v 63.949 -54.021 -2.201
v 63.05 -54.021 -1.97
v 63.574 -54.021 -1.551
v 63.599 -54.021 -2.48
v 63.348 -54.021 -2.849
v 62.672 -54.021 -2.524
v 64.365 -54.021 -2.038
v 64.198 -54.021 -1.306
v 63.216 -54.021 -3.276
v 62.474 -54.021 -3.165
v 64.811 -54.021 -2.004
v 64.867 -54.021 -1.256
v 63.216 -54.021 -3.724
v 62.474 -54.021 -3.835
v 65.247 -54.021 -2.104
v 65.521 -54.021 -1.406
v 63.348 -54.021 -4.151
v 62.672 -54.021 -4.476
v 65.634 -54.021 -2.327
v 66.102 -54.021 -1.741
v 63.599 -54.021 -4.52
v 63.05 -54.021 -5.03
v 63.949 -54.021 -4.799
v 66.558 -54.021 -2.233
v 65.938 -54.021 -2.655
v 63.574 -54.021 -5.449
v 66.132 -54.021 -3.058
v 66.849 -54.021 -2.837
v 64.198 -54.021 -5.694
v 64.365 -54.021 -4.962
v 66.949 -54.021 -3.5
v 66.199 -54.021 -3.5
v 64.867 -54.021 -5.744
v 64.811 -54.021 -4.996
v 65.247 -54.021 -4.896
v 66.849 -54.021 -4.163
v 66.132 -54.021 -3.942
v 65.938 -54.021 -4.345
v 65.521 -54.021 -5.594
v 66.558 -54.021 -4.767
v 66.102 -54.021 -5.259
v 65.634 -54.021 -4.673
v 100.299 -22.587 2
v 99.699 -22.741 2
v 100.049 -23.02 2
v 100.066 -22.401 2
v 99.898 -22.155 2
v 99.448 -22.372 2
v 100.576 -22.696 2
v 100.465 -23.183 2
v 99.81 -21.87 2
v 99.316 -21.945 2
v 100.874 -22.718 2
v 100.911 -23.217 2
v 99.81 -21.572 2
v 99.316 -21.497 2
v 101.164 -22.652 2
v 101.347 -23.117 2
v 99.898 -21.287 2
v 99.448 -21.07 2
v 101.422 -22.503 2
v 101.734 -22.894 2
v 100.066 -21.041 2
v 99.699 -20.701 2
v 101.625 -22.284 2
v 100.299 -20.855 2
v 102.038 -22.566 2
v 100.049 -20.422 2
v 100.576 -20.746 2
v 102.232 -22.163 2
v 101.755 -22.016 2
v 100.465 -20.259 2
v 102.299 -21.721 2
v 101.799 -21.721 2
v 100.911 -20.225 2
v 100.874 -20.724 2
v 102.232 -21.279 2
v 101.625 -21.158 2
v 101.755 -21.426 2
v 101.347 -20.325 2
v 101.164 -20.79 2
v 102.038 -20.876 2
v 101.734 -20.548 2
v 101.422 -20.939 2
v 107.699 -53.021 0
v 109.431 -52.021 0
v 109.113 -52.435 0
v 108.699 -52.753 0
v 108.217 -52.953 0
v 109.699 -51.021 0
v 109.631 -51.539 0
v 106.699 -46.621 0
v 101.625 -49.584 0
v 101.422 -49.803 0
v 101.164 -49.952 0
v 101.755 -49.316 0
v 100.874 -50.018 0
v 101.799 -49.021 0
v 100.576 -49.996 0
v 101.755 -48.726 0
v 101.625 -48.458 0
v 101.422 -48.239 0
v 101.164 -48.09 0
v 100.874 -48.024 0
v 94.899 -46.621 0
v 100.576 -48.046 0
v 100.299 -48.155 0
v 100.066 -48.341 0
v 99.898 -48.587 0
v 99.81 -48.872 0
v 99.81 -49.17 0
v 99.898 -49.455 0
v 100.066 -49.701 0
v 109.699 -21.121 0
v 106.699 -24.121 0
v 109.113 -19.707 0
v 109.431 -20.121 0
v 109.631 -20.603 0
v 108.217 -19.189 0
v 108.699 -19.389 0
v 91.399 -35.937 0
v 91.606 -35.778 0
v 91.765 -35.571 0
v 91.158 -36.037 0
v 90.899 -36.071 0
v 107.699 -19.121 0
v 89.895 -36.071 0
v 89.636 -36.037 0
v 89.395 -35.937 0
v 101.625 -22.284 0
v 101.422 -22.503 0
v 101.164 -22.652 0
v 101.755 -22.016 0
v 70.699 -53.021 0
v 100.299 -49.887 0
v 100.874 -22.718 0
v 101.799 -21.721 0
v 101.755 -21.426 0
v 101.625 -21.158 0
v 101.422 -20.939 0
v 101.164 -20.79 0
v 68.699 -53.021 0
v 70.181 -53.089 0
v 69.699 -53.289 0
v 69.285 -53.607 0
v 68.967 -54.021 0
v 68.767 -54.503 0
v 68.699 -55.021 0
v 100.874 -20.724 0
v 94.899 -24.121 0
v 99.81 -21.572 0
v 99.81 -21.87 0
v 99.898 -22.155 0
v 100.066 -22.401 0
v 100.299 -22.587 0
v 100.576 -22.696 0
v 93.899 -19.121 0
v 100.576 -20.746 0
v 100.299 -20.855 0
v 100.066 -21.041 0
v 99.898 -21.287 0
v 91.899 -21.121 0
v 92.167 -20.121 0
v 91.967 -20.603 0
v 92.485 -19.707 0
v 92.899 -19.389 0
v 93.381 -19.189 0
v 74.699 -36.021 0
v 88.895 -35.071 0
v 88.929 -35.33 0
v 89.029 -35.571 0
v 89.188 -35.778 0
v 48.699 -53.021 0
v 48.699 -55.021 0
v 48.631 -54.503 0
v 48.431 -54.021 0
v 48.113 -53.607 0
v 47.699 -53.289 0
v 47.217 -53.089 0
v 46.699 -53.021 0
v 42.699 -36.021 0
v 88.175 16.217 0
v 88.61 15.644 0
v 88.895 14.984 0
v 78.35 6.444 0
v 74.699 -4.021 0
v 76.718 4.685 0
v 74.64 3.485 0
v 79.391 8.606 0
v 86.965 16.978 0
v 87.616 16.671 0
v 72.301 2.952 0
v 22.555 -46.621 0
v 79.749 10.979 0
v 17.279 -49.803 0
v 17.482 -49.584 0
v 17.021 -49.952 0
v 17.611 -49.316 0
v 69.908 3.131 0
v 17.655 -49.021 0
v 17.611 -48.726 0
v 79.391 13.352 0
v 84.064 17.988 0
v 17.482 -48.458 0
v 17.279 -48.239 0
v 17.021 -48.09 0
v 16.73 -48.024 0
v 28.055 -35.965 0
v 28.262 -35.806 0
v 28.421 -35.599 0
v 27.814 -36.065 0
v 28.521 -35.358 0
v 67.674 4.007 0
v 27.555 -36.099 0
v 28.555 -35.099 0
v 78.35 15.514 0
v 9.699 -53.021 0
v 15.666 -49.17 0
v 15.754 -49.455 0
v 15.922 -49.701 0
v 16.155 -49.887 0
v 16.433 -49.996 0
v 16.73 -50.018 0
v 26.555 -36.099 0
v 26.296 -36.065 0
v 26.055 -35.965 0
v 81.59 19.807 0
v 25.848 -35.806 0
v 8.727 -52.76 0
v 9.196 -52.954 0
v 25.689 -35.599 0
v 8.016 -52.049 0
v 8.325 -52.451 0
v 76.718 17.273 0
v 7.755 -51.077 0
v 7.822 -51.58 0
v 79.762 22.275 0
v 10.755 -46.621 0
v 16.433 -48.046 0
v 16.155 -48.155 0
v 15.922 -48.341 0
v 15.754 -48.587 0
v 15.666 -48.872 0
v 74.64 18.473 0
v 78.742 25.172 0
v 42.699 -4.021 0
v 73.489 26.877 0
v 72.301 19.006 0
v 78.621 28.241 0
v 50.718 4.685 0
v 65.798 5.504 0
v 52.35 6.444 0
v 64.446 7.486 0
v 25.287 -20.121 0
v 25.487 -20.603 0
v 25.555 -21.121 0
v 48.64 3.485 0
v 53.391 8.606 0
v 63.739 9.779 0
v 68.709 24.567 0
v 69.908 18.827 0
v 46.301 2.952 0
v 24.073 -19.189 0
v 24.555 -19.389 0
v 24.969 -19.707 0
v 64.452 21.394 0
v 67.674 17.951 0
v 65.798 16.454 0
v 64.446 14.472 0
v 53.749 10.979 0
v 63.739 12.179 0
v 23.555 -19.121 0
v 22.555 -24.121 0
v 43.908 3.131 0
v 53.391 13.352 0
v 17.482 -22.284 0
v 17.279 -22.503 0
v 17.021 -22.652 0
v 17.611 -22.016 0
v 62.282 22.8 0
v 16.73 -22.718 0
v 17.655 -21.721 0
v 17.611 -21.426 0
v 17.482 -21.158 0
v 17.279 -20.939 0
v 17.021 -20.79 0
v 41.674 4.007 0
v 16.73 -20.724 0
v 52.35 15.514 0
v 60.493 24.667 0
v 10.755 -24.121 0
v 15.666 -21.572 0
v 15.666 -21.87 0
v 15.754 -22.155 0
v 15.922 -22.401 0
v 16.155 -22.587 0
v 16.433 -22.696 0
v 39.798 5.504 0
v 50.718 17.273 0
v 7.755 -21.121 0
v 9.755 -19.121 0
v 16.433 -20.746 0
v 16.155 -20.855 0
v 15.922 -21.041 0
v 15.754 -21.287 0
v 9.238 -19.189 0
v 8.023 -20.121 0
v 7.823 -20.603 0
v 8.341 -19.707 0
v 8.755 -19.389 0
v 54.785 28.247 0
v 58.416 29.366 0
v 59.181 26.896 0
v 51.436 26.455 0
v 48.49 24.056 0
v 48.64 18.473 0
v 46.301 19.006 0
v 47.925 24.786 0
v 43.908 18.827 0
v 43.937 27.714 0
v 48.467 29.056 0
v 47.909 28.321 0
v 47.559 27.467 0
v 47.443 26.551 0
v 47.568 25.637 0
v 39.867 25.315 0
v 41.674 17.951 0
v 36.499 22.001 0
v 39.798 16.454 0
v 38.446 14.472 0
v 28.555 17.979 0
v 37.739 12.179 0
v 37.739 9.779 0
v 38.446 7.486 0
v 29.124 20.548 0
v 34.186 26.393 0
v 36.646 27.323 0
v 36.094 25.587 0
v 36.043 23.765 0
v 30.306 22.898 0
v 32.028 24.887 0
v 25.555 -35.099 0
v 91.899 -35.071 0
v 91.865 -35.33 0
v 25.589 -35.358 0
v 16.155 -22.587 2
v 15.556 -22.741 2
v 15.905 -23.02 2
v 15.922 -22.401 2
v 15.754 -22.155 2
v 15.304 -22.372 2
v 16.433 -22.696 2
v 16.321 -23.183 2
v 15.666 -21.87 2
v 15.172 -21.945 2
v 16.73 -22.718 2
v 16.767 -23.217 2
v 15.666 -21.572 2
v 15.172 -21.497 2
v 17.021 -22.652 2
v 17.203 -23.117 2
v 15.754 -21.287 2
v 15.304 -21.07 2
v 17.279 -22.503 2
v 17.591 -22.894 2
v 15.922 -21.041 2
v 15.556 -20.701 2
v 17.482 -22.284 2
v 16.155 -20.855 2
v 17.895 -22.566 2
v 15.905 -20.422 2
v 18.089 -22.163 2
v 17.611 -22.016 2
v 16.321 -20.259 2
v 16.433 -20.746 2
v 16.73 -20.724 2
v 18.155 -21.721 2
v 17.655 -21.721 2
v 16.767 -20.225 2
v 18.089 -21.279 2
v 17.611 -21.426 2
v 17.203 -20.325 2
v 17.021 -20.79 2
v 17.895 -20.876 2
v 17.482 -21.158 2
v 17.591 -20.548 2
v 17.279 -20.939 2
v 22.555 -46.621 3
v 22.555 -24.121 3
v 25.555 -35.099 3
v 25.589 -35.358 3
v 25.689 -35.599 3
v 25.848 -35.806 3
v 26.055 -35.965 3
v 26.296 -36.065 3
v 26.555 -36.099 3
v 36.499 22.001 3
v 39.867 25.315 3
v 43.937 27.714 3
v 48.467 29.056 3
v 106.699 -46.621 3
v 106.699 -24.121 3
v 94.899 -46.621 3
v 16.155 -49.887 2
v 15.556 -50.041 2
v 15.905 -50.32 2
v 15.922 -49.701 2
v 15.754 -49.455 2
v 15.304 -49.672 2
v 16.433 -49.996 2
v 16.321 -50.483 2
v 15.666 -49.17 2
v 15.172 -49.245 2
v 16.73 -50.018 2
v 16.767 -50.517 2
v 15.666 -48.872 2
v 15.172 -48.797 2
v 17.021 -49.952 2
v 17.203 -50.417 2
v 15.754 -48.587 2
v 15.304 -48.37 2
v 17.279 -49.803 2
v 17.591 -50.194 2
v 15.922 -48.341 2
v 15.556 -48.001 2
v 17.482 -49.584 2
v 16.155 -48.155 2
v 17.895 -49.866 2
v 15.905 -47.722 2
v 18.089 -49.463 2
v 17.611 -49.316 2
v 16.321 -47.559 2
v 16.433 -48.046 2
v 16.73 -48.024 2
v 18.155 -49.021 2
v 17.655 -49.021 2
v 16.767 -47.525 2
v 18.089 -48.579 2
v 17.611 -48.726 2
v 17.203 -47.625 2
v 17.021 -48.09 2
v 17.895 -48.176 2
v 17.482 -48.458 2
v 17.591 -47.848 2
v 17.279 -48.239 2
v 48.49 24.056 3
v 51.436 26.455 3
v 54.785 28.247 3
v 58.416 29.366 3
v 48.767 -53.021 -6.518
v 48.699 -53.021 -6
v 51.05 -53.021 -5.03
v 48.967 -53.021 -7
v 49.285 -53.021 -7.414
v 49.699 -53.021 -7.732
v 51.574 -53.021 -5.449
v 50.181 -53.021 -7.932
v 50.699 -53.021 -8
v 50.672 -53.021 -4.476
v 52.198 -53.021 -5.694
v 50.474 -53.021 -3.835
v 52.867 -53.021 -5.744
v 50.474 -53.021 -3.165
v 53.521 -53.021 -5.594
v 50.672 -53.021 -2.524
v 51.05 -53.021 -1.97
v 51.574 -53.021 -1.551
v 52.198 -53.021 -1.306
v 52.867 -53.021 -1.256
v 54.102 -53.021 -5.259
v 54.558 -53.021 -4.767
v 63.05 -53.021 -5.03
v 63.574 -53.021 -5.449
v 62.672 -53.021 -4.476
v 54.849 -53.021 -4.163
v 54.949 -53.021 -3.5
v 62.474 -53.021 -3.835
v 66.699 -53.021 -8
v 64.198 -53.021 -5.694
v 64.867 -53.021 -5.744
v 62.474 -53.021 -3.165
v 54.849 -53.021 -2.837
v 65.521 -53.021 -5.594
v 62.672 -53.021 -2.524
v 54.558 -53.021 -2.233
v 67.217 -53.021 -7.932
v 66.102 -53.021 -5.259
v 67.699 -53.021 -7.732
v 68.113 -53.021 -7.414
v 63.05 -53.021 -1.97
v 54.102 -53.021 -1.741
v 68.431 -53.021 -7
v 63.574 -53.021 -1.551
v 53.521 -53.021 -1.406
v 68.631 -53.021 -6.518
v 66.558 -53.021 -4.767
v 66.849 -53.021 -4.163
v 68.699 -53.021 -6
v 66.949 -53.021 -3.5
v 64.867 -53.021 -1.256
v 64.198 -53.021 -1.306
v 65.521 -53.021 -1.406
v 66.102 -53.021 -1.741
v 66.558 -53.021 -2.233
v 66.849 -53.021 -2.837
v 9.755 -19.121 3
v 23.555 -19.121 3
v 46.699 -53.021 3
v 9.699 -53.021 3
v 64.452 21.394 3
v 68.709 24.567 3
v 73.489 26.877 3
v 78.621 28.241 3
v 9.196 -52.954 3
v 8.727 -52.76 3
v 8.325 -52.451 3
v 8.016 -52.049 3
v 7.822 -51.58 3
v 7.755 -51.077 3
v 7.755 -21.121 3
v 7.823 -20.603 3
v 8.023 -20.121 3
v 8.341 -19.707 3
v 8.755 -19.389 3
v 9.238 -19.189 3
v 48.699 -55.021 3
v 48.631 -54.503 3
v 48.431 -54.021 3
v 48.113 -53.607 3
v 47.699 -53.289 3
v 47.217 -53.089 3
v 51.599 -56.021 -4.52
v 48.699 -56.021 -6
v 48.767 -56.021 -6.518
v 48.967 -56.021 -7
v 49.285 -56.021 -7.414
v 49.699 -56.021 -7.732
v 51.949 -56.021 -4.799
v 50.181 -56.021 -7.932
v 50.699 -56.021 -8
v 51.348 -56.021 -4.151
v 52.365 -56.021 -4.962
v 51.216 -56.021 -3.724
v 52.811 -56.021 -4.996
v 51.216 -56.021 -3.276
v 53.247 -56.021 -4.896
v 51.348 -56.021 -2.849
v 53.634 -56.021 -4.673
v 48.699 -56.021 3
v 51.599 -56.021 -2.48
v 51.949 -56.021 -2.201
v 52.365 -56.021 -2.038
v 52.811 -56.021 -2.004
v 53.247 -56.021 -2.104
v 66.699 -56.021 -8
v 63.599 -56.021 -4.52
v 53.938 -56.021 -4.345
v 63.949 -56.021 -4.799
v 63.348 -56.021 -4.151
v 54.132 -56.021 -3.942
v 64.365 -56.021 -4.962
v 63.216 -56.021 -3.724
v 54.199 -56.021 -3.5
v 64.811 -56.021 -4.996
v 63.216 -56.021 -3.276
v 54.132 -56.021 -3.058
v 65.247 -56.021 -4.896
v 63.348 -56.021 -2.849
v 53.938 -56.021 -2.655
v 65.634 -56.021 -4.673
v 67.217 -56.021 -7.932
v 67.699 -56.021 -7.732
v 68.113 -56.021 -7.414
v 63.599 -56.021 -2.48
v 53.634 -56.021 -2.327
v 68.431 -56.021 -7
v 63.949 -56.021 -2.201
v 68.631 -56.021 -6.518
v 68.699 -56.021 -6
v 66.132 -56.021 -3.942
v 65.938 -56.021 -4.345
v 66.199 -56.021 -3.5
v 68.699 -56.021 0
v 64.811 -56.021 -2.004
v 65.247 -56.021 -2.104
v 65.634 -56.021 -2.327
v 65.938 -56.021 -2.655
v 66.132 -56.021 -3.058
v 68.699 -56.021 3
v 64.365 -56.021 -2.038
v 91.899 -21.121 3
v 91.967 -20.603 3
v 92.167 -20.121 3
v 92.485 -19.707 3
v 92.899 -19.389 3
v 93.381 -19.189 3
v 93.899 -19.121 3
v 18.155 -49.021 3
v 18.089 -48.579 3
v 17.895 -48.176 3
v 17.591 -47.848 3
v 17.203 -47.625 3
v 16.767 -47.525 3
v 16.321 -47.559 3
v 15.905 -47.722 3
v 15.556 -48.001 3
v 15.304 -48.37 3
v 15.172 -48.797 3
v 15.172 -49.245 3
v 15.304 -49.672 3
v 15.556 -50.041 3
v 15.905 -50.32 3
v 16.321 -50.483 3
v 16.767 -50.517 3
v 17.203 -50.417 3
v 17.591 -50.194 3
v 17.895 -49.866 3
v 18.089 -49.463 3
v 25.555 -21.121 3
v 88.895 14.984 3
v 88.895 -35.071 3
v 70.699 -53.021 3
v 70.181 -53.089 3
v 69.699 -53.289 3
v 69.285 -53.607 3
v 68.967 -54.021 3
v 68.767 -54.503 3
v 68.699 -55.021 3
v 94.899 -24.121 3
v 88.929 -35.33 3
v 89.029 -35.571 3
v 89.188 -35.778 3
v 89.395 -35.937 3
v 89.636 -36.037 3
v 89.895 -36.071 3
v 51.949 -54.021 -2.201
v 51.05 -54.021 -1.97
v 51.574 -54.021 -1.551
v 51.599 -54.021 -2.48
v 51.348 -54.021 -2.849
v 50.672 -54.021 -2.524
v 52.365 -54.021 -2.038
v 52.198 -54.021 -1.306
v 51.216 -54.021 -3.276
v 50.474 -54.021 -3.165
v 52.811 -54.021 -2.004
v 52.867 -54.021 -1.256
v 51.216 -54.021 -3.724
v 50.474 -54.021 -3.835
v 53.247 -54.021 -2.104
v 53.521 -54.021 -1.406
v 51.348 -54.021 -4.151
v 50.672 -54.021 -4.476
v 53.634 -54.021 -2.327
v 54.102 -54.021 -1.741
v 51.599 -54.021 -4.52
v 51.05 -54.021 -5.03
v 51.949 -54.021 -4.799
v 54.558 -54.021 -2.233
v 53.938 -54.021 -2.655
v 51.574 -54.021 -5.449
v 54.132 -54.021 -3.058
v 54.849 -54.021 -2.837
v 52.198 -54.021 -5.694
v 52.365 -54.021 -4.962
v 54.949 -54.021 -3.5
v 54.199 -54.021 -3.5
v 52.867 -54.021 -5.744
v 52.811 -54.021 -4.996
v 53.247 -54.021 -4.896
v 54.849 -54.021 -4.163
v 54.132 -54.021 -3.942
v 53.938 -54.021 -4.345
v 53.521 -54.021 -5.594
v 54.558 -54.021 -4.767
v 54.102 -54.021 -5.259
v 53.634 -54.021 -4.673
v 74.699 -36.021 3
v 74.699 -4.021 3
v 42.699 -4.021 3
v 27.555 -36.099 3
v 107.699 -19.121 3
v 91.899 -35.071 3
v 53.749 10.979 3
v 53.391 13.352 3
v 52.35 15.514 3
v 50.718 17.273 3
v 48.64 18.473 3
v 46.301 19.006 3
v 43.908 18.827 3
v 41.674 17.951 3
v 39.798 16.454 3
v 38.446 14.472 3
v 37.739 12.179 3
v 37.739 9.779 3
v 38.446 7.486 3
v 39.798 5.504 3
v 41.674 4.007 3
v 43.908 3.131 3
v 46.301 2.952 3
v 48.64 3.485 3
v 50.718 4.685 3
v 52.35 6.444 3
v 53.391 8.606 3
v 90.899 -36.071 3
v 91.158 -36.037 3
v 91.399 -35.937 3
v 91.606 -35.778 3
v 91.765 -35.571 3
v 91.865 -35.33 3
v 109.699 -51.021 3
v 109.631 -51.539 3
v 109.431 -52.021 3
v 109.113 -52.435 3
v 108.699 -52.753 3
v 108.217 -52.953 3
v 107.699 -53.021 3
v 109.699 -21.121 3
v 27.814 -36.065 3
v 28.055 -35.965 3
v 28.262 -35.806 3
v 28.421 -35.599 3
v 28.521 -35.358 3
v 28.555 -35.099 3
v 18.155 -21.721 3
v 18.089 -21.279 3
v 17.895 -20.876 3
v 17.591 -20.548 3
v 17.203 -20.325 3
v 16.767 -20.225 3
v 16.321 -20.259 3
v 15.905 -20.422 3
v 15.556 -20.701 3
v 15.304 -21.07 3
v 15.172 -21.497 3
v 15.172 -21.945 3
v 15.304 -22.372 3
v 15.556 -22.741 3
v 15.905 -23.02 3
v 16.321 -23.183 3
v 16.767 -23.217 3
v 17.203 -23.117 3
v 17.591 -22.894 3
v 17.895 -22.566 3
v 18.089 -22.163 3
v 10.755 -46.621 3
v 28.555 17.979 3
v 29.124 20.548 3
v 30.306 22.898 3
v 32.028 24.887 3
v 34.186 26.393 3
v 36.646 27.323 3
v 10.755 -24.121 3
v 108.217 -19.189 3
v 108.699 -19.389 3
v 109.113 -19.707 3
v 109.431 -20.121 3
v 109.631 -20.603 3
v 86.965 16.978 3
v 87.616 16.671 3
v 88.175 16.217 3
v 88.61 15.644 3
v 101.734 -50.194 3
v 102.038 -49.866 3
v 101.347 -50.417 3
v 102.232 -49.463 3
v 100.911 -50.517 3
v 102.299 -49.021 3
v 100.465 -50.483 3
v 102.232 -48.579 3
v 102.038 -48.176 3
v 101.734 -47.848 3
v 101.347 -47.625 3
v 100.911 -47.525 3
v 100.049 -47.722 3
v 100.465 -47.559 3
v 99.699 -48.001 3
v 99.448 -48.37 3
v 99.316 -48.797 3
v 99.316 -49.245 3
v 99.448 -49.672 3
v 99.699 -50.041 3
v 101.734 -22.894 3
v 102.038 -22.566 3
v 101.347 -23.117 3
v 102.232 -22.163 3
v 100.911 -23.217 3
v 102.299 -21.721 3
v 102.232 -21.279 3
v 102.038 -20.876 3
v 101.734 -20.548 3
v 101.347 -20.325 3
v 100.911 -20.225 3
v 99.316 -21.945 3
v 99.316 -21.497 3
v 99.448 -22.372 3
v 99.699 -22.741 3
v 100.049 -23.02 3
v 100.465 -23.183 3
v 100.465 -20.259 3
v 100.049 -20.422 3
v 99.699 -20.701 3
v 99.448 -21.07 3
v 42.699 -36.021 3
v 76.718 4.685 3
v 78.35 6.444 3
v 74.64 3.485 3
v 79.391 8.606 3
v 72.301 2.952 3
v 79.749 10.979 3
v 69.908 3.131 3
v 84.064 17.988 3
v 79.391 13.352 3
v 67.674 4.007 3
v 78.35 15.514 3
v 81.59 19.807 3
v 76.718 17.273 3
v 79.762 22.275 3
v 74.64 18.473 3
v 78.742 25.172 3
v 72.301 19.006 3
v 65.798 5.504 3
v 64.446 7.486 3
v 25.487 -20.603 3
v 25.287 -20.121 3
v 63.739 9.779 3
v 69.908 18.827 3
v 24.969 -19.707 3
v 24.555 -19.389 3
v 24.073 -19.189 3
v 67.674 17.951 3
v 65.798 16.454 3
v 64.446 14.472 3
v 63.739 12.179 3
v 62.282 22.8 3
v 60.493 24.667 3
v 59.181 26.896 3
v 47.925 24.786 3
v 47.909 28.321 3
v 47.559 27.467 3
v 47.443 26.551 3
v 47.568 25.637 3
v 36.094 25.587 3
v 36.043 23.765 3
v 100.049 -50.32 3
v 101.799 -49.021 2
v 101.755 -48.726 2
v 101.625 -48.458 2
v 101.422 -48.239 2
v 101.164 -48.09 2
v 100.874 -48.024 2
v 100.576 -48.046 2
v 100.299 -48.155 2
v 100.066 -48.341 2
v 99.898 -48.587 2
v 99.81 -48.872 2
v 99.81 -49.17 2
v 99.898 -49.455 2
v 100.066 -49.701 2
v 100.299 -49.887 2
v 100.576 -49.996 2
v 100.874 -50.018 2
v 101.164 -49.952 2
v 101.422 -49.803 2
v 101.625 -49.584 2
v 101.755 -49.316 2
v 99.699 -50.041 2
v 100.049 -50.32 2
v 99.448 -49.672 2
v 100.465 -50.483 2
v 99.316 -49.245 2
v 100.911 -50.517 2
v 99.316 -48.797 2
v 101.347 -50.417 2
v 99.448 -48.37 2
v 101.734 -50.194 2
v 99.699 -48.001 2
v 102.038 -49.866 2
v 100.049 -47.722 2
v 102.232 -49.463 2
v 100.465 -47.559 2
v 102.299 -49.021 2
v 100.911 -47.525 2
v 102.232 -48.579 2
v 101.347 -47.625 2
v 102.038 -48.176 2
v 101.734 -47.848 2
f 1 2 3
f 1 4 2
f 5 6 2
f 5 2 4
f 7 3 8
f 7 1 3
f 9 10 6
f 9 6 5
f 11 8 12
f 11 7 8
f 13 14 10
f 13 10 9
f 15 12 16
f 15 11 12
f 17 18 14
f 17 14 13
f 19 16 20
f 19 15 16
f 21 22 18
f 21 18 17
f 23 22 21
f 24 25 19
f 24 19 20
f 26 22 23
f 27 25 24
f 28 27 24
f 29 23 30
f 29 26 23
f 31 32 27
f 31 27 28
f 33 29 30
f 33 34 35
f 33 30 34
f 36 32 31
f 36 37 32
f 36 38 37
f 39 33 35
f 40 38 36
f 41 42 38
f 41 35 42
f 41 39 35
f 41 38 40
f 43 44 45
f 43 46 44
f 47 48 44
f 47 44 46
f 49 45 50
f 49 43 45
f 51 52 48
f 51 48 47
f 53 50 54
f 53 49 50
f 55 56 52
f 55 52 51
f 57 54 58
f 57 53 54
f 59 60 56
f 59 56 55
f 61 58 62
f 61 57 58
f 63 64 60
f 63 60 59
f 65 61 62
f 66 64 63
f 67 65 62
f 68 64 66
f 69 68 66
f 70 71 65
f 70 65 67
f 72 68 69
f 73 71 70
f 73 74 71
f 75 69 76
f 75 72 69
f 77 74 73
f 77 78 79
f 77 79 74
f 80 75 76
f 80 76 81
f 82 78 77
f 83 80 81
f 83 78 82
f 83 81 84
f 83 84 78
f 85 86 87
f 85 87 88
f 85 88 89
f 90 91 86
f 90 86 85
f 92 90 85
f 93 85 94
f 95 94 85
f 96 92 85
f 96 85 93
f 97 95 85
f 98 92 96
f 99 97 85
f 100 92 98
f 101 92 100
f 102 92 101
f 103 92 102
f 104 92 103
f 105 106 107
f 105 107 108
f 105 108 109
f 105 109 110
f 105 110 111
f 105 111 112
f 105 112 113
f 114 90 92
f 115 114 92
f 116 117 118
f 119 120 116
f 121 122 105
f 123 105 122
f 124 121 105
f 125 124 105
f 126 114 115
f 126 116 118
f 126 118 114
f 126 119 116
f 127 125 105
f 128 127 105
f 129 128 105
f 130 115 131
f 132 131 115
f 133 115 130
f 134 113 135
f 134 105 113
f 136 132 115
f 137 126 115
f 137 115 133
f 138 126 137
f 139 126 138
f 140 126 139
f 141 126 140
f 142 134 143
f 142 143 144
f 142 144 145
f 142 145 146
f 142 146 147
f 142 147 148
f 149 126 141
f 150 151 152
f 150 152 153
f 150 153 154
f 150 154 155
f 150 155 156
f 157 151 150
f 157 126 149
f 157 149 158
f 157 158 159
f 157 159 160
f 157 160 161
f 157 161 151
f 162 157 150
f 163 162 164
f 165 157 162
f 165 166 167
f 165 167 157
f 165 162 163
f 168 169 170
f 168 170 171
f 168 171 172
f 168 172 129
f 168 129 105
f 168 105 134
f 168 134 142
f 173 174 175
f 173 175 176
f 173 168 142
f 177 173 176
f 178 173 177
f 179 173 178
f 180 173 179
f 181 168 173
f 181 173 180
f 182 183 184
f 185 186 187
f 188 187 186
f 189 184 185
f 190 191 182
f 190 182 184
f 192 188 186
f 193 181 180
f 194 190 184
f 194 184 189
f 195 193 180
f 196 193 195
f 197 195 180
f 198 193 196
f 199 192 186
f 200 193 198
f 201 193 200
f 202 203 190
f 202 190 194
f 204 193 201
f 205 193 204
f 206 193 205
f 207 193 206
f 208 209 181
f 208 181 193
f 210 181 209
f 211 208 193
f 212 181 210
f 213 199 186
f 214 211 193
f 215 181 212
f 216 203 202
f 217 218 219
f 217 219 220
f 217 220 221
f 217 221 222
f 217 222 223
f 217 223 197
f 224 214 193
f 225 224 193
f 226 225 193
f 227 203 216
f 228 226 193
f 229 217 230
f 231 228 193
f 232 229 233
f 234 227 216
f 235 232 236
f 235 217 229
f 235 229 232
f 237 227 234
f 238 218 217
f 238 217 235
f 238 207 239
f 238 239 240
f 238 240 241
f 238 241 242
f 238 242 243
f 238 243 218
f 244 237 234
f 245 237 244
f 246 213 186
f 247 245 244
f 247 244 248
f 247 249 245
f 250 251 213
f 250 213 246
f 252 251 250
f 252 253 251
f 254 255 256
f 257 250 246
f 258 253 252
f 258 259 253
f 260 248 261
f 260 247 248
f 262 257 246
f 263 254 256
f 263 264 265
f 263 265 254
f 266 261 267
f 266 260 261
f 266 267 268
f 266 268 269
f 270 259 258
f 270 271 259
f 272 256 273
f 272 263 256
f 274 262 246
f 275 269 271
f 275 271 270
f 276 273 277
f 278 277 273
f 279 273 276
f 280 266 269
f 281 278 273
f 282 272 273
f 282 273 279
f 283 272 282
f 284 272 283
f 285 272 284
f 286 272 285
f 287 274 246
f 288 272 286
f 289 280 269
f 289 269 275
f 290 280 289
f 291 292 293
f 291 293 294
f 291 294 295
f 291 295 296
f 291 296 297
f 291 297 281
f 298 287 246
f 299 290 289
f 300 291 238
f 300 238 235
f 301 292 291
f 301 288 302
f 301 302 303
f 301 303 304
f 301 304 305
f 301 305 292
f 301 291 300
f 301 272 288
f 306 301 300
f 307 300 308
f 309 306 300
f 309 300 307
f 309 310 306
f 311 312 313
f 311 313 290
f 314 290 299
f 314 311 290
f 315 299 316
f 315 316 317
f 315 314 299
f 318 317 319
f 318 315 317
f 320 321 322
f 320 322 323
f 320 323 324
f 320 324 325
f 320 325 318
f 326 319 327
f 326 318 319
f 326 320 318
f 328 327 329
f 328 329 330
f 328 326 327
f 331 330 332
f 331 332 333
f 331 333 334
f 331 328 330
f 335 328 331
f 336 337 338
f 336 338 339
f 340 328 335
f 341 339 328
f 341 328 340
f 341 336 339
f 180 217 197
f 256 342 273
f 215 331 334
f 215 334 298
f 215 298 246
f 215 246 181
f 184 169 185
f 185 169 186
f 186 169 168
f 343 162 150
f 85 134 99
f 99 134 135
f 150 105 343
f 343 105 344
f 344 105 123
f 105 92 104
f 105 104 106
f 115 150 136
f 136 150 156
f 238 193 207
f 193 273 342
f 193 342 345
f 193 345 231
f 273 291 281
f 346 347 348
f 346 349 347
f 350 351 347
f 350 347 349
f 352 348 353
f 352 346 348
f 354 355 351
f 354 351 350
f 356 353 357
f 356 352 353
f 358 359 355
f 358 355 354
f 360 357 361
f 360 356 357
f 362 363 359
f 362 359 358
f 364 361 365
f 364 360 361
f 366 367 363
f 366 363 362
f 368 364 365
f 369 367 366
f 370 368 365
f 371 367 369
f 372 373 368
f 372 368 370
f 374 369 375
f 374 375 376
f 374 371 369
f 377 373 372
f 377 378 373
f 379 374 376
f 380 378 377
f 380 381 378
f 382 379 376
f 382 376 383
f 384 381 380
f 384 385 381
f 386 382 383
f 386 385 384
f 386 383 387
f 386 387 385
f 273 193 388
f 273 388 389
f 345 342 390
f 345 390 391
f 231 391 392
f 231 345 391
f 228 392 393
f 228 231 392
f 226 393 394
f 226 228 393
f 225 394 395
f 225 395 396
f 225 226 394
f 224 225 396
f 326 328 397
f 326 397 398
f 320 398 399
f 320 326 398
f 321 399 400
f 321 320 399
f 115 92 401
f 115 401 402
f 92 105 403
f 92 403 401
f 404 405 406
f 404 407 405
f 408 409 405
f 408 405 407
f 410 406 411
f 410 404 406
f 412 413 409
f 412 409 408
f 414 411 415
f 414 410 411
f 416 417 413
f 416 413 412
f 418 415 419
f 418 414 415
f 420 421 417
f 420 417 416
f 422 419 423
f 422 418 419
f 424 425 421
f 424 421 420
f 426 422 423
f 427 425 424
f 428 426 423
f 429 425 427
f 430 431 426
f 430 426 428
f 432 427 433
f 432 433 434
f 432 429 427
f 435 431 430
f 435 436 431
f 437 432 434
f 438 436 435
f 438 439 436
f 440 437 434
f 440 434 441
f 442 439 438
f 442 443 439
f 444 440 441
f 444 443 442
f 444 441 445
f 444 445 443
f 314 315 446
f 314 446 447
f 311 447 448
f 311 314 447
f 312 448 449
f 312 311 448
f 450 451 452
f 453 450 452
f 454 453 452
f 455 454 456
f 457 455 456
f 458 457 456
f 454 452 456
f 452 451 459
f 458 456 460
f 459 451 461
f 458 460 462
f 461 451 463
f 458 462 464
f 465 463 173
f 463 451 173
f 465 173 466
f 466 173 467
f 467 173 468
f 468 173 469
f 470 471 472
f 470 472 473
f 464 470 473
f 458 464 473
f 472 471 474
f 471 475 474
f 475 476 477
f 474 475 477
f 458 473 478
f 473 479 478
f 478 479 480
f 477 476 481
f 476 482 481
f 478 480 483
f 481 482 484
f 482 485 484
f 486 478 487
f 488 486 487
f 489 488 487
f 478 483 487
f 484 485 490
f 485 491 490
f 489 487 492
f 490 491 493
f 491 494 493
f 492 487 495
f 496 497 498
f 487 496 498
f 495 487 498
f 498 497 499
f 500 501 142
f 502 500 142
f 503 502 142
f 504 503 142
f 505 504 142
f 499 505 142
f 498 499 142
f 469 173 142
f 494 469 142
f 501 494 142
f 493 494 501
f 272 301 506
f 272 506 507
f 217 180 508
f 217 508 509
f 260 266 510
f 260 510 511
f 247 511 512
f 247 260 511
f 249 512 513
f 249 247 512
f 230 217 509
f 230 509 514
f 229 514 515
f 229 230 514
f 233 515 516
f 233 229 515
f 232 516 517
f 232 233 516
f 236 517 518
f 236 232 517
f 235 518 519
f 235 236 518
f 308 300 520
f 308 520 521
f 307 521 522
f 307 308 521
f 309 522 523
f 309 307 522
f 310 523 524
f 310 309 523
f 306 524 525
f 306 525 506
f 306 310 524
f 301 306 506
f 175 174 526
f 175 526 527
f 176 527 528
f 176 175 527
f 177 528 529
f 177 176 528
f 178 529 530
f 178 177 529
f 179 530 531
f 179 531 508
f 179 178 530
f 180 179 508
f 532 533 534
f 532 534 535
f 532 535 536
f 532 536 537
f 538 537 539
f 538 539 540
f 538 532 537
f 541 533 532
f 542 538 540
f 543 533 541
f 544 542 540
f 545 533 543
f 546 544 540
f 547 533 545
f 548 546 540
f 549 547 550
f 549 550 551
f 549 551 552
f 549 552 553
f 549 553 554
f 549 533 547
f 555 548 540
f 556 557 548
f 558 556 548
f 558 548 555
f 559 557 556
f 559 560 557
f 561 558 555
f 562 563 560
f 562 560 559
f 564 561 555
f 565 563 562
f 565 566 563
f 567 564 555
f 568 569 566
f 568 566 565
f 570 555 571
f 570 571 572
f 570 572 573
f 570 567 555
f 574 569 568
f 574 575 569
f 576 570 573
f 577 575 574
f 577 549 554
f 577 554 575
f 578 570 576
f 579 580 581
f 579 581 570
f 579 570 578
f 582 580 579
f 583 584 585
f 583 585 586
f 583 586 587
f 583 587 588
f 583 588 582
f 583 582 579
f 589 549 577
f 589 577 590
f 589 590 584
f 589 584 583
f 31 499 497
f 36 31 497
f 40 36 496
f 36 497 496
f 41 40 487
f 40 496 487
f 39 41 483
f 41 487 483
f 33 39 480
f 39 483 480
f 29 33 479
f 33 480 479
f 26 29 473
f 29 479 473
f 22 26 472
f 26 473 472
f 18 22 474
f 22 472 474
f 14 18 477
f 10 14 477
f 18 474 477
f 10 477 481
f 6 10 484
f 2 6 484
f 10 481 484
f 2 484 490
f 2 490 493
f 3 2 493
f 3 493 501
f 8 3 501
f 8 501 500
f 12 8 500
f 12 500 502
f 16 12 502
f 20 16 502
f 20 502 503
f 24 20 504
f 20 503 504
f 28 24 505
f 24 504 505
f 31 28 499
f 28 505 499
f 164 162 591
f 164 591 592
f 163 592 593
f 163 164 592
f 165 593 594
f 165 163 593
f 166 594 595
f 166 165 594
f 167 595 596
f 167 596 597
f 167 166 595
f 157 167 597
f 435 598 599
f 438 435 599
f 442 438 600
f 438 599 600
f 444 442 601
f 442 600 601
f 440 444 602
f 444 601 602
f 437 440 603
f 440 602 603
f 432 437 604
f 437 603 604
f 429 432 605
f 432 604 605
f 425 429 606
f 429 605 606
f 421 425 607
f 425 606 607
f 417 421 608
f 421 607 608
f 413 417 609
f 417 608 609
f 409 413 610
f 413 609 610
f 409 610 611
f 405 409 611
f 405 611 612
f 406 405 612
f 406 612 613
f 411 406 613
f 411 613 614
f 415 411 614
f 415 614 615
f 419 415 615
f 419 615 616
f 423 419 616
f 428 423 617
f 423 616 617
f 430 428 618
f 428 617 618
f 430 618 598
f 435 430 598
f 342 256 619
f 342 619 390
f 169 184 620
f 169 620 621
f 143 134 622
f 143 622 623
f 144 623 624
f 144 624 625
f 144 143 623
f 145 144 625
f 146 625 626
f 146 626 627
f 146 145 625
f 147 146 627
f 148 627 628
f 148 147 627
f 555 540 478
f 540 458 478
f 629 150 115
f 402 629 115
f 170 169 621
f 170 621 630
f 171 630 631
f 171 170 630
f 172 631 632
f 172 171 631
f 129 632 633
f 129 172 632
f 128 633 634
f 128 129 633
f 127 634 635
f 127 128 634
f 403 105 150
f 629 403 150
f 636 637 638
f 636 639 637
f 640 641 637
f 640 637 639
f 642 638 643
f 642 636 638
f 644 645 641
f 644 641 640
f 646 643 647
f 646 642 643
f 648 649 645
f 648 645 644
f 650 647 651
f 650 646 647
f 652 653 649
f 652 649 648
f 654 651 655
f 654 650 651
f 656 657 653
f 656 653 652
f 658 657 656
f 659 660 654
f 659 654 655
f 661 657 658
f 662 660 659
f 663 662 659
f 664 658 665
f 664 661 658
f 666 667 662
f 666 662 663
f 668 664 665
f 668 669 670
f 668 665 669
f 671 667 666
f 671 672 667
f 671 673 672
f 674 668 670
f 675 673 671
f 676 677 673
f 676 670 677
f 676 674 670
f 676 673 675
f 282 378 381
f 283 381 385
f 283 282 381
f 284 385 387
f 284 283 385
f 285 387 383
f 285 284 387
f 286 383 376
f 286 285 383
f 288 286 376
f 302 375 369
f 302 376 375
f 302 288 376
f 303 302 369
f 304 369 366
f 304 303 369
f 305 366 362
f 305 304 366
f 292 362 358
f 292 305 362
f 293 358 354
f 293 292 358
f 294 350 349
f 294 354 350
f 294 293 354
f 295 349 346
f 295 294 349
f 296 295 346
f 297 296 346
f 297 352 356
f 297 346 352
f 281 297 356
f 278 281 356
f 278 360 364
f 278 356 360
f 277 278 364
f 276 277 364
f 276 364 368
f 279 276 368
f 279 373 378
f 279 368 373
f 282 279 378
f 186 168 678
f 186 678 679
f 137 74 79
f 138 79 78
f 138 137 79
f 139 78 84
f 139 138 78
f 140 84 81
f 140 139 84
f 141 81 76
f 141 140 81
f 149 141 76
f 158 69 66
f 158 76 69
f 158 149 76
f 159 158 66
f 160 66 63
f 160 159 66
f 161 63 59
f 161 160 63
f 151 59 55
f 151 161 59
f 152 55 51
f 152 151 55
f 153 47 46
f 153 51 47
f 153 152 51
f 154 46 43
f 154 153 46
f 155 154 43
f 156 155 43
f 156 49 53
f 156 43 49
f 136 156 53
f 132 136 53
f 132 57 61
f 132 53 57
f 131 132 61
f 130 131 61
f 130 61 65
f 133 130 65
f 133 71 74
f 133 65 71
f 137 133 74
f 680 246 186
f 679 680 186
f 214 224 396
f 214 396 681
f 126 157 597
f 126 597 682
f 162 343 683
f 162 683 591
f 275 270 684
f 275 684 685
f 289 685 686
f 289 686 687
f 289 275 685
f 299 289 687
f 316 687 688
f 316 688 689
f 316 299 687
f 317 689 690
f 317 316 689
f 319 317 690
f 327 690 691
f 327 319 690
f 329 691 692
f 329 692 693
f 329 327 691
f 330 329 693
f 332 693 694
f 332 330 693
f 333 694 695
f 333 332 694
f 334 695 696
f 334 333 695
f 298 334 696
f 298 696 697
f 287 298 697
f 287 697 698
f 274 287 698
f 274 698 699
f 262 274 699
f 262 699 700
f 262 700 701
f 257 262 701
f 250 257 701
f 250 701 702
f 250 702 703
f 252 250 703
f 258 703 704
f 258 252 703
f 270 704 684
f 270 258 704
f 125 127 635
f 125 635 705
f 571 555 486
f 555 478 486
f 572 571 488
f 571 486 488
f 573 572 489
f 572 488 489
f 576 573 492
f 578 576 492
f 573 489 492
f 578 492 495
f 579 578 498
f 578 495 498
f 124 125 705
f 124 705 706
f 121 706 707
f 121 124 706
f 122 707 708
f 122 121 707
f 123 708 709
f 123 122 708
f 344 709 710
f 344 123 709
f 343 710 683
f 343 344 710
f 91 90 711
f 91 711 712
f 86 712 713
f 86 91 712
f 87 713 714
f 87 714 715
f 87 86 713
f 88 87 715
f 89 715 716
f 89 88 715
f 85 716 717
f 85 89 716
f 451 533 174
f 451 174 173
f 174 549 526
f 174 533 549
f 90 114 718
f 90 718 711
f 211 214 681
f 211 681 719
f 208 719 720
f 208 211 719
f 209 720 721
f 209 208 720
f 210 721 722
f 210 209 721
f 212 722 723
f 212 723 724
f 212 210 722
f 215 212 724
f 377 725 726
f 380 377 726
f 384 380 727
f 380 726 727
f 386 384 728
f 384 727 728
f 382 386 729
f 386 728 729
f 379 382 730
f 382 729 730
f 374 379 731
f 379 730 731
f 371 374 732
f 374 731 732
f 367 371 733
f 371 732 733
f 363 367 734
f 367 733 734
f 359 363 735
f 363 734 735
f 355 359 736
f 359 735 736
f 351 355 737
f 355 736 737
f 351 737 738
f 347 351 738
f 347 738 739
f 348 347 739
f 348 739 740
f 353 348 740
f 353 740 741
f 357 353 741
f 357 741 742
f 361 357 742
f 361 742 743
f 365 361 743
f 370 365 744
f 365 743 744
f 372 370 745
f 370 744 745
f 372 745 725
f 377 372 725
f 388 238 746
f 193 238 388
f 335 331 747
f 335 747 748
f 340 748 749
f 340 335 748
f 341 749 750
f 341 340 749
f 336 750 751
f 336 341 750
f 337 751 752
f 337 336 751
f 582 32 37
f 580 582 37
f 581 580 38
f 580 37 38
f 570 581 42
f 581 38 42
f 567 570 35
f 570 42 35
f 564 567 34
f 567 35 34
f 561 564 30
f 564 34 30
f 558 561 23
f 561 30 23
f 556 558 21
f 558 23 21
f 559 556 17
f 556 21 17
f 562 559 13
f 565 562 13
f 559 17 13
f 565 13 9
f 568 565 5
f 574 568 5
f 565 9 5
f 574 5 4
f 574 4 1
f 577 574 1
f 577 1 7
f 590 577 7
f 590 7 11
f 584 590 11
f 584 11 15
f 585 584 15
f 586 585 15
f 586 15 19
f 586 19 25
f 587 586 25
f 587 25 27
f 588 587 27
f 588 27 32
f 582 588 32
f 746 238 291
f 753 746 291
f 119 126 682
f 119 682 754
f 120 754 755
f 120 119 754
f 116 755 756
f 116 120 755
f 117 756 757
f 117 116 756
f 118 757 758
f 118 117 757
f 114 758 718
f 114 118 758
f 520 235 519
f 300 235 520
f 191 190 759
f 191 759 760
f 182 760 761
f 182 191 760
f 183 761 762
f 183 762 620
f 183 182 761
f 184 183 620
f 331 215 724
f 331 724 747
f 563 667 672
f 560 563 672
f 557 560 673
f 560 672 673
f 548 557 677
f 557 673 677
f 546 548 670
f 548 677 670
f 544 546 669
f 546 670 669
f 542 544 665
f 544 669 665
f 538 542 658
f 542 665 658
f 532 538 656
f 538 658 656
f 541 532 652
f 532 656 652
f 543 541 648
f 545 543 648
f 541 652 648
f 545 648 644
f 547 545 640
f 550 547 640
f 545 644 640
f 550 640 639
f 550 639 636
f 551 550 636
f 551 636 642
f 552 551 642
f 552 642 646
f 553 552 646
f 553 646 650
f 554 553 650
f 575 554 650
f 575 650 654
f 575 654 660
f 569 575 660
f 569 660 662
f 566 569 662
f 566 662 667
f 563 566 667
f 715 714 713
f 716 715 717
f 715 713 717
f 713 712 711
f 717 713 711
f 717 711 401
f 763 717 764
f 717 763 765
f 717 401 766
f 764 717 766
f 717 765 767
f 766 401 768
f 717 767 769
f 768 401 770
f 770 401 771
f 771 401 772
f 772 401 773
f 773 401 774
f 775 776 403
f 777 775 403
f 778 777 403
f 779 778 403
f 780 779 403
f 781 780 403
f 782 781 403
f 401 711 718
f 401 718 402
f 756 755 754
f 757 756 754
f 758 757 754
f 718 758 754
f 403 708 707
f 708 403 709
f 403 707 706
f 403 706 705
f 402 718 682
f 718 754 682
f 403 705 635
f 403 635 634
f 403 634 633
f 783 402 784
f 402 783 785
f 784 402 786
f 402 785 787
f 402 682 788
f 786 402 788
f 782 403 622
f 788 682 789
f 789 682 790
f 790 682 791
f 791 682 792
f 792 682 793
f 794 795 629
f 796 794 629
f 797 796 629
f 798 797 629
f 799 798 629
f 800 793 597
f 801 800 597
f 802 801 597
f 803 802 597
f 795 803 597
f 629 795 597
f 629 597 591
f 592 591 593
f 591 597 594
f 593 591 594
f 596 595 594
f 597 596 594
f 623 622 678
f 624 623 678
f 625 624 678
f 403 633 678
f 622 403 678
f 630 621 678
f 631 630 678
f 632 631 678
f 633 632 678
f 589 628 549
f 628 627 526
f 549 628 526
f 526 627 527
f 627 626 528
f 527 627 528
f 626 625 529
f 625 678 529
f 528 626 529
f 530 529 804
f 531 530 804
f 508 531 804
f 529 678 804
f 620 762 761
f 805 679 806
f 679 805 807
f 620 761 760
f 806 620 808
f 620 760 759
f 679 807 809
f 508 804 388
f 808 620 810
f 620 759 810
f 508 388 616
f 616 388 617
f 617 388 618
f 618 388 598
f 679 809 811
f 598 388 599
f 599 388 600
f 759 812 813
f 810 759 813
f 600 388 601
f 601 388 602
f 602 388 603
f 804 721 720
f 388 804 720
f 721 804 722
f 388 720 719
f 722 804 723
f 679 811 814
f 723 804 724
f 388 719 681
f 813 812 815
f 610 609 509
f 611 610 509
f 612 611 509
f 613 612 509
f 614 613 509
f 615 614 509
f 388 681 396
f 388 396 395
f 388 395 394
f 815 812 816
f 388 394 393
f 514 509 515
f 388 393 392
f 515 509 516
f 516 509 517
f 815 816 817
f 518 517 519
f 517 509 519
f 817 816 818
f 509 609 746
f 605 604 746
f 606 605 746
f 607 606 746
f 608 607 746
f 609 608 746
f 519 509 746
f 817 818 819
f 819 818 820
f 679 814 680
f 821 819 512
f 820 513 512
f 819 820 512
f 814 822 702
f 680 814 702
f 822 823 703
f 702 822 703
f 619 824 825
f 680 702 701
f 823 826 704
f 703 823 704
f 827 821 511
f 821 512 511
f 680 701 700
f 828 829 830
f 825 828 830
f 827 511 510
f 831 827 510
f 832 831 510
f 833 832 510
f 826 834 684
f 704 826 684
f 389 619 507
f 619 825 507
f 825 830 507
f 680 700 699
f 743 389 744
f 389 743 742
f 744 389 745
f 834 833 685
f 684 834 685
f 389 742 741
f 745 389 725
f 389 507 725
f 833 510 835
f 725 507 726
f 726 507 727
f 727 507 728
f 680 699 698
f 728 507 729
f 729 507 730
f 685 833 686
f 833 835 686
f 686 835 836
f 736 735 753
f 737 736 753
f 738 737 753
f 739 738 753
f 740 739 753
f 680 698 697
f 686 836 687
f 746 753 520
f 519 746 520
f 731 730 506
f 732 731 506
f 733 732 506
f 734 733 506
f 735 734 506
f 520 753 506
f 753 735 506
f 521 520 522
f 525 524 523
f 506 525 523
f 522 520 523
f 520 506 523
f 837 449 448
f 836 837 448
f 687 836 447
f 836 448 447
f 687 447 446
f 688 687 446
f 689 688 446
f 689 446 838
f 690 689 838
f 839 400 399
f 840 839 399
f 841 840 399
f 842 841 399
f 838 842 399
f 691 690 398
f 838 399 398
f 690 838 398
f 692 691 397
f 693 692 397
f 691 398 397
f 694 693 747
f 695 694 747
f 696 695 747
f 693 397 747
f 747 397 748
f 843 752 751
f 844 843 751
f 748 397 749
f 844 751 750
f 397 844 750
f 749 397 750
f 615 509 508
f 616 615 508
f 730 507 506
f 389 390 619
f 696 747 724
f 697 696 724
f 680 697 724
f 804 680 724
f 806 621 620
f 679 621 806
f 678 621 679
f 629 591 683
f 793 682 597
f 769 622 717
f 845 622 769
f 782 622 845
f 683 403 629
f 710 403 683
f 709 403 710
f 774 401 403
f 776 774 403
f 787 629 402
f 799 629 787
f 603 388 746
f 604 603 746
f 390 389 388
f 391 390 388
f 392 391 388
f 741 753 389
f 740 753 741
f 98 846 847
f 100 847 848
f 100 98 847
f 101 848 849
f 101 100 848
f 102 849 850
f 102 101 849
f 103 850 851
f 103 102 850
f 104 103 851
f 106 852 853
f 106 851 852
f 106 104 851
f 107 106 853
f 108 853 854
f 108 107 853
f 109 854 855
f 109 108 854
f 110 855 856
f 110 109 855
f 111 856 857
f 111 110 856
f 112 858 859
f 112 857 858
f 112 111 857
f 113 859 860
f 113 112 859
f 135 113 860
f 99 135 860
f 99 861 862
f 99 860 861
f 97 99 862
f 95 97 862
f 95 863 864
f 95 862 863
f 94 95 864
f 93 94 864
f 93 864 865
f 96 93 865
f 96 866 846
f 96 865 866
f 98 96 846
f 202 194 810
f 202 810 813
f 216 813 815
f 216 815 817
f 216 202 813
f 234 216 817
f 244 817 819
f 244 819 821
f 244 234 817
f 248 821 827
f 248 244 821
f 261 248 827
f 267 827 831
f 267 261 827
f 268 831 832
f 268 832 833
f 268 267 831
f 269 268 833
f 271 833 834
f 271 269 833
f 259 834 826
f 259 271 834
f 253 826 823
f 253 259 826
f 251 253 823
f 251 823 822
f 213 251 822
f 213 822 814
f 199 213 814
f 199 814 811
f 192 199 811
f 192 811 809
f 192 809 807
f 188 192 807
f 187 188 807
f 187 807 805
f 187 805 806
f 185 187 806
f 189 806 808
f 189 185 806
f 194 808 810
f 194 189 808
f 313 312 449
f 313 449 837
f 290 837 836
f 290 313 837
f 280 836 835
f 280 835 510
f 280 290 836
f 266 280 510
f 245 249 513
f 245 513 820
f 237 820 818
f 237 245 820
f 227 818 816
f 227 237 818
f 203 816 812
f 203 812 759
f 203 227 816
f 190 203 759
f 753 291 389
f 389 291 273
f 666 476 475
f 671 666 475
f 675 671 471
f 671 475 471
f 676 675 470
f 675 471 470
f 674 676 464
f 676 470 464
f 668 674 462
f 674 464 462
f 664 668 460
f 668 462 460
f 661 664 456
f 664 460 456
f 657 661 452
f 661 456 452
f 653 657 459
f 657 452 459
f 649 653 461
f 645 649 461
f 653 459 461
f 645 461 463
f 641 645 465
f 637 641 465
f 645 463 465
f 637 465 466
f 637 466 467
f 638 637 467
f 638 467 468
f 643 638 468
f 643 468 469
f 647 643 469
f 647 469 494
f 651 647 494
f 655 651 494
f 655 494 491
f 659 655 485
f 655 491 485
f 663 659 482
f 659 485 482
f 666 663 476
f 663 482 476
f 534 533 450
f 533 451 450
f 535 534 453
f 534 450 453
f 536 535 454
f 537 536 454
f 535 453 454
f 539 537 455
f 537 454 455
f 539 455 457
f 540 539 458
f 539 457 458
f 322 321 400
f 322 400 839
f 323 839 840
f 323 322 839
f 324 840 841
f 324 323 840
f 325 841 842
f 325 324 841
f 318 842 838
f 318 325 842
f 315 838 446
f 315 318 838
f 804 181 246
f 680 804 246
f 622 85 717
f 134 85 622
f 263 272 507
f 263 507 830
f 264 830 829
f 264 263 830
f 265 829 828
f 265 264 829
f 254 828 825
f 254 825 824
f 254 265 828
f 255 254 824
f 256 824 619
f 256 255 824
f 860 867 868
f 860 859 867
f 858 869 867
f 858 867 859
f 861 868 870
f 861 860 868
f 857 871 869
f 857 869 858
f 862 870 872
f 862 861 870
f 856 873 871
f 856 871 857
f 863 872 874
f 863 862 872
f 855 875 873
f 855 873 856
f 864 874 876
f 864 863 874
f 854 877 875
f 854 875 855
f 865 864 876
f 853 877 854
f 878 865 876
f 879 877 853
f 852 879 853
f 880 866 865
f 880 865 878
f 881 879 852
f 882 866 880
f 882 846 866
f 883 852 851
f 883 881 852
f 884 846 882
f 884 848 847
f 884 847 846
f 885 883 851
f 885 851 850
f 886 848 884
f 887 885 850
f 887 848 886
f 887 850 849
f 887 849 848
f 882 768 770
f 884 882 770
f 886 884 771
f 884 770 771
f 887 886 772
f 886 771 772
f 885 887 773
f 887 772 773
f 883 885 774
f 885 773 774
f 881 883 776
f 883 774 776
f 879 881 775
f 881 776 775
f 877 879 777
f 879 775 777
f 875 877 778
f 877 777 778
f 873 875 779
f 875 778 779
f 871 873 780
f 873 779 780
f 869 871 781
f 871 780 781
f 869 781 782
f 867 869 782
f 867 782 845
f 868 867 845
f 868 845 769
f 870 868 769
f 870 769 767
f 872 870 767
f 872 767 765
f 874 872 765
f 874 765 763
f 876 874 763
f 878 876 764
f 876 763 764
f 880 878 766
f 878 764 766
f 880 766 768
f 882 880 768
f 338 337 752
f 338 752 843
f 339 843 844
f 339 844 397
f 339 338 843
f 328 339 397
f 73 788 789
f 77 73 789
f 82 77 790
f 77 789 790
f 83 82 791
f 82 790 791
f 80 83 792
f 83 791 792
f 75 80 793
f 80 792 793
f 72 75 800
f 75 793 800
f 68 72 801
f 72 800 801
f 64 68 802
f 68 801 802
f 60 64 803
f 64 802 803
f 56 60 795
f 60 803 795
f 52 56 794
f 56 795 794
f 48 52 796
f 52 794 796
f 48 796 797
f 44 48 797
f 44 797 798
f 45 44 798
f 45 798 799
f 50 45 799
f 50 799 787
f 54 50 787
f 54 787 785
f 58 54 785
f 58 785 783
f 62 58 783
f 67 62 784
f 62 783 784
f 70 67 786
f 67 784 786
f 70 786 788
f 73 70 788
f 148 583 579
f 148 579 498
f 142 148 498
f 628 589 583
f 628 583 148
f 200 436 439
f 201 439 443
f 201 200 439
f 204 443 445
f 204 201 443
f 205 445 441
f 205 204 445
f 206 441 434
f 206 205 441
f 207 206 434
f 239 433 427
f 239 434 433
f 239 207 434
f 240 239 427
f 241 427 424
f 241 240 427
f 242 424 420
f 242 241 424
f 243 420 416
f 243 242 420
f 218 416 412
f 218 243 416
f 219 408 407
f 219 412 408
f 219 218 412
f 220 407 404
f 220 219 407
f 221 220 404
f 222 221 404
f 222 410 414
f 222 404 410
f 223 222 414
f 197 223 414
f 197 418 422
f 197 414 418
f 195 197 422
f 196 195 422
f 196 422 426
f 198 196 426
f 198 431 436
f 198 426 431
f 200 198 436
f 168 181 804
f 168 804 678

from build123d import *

# Parameters (mm, degrees)
MODEL_R                 = 8.05
MODEL_R_2               = 1
MODEL_W                 = 32
MODEL_H                 = 32
MODEL_W_2               = 11.8
MODEL_H_2               = 22.5
SALIENTE_EXTRUIR1_DEPTH = 3
CROQUIS2_W              = 19.999999999
CROQUIS2_H              = 3
SALIENTE_EXTRUIR2_DEPTH = 11
CROQUIS3_R              = 1.5
CORTAR_EXTRUIR1_DEPTH   = 3
REDONDEO1_R             = 2
CROQUIS4_R              = 2.25
CORTAR_EXTRUIR2_DEPTH   = 1
CROQUIS6_R              = 1.5
CORTAR_EXTRUIR4_DEPTH   = 1


with BuildPart() as part:
    # Model → Saliente-Extruir1 (new body)
    with BuildSketch(Plane.XY):
        with BuildLine():
            Line((68.698959582, -55.021016271), (68.698959582, -56.021017288))
            Line((68.698959582, -56.021017288), (48.698959583, -56.021017288))
            Line((48.698959583, -56.021017288), (48.698959583, -55.020994548))
            ThreePointArc((48.698959583, -55.020994548), (48.113181185, -53.606789026), (46.698982323, -53.020994548))
            Line((46.698982323, -53.020994548), (9.698959583, -53.020573857))
            ThreePointArc((9.698959583, -53.020573857), (8.324569809, -52.451282972), (7.755278924, -51.076893199))
            Line((7.755278924, -51.076893199), (7.755278924, -21.120997464))
            ThreePointArc((7.755278924, -21.120997464), (8.341065362, -19.706783901), (9.755278924, -19.120997464))
            Line((9.755278924, -19.120997464), (23.555278924, -19.120997464))
            ThreePointArc((23.555278924, -19.120997464), (24.969492487, -19.706783901), (25.555278924, -21.120997464))
            Line((25.555278924, -21.120997464), (25.555278924, -35.098945331))
            ThreePointArc((25.555278924, -35.098945331), (25.848172143, -35.806052112), (26.555278924, -36.098945331))
            Line((26.555278924, -36.098945331), (27.555278924, -36.098945331))
            ThreePointArc((27.555278924, -36.098945331), (28.262385705, -35.806052112), (28.555278924, -35.098945331))
            Line((28.555278924, -35.098945331), (28.555278924, 17.979002536))
            ThreePointArc((28.555278924, 17.979002536), (31.105578849, 23.945942388), (36.646410135, 27.323454721))
            ThreePointArc((36.646410135, 27.323454721), (36.00468524, 24.677778482), (36.499385848, 22.000712008))
            ThreePointArc((36.499385848, 22.000712008), (41.828182769, 26.639397126), (48.466982875, 29.055966887))
            ThreePointArc((48.466982875, 29.055966887), (47.442986911, 26.551218848), (48.490036744, 24.056020035))
            ThreePointArc((48.490036744, 24.056020035), (53.067544133, 27.431151144), (58.41559095, 29.365958406))
            ThreePointArc((58.41559095, 29.365958406), (60.493005652, 24.667283017), (64.452413363, 21.393708086))
            ThreePointArc((64.452413363, 21.393708086), (71.044296854, 25.835788254), (78.620547187, 28.241081393))
            ThreePointArc((78.620547187, 28.241081393), (80.583592254, 20.972839466), (86.965006165, 16.978037452))
            ThreePointArc((86.965006165, 16.978037452), (88.174666897, 16.217466641), (88.895278924, 14.983584414))
            Line((88.895278924, 14.983584414), (88.895278924, -35.070997464))
            ThreePointArc((88.895278924, -35.070997464), (89.188172143, -35.778104245), (89.895278924, -36.070997464))
            Line((89.895278924, -36.070997464), (90.898959582, -36.070997464))
            ThreePointArc((90.898959582, -36.070997464), (91.606066364, -35.778104245), (91.898959582, -35.070997464))
            Line((91.898959582, -35.070997464), (91.898959582, -21.120997464))
            ThreePointArc((91.898959582, -21.120997464), (92.48474602, -19.706783901), (93.898959582, -19.120997464))
            Line((93.898959582, -19.120997464), (107.698959583, -19.120997464))
            ThreePointArc((107.698959583, -19.120997464), (109.113173145, -19.706783901), (109.698959582, -21.120997464))
            Line((109.698959582, -21.120997464), (109.698959582, -51.020997464))
            ThreePointArc((109.698959582, -51.020997464), (109.113173145, -52.435211026), (107.698959583, -53.020997464))
            Line((107.698959583, -53.020997464), (70.698958566, -53.021016271))
            ThreePointArc((70.698958566, -53.021016271), (69.284745661, -53.606803068), (68.698959582, -55.021016271))
        make_face()
        with Locations((71.698959582, 10.979002536)):
            Circle(MODEL_R, mode=Mode.SUBTRACT)
        with Locations((45.698959583, 10.979002536)):
            Circle(MODEL_R, mode=Mode.SUBTRACT)
        with Locations((100.798959583, -21.720997464)):
            Circle(MODEL_R_2, mode=Mode.SUBTRACT)
        with Locations((100.798959583, -49.020997464)):
            Circle(MODEL_R_2, mode=Mode.SUBTRACT)
        with Locations((16.655278924, -49.020997464)):
            Circle(MODEL_R_2, mode=Mode.SUBTRACT)
        with Locations((16.655278924, -21.720997464)):
            Circle(MODEL_R_2, mode=Mode.SUBTRACT)
        with Locations((58.698959582, -20.020997464)):
            Rectangle(MODEL_W, MODEL_H, mode=Mode.SUBTRACT)
        with Locations((100.798959582, -35.370997464)):
            Rectangle(MODEL_W_2, MODEL_H_2, mode=Mode.SUBTRACT)
        with Locations((16.655278924, -35.370997464)):
            Rectangle(MODEL_W_2, MODEL_H_2, mode=Mode.SUBTRACT)
    extrude(amount=SALIENTE_EXTRUIR1_DEPTH)

    # Croquis2 → Saliente-Extruir2 (add)
    with BuildSketch(Plane.XY.offset(3)):
        with Locations((58.698959583, -54.521017288)):
            Rectangle(CROQUIS2_W, CROQUIS2_H)
    extrude(amount=-SALIENTE_EXTRUIR2_DEPTH)

    # Croquis3 → Cortar-Extruir1 (cut)
    with BuildSketch(Plane(origin=(0, -53.021017288, 0), x_dir=(1, 0, 0), z_dir=(0, 1, 0))):
        with Locations((52.698959583, 3.5)):
            Circle(CROQUIS3_R)
        with Locations((64.698959583, 3.5)):
            Circle(CROQUIS3_R)
    extrude(amount=-CORTAR_EXTRUIR1_DEPTH, mode=Mode.SUBTRACT)

    # Redondeo1
    redondeo1_edges = [part.edges().sort_by_distance(p)[0] for p in [
        (48.698959583, -54.521017288, -8),
        (68.698959582, -54.521017288, -8),
    ]]
    fillet(redondeo1_edges, radius=REDONDEO1_R)

    # Croquis4 → Cortar-Extruir2 (cut)
    with BuildSketch(Plane(origin=(0, -53.021017288, 0), x_dir=(1, 0, 0), z_dir=(0, 1, 0))):
        with Locations((52.698959583, 3.5)):
            Circle(CROQUIS4_R)
        with Locations((64.698959583, 3.5)):
            Circle(CROQUIS4_R)
    extrude(amount=-CORTAR_EXTRUIR2_DEPTH, mode=Mode.SUBTRACT)

    # Croquis6 → Cortar-Extruir4 (cut)
    with BuildSketch(Plane.XY.offset(3)):
        with Locations((16.655278924, -21.720997464)):
            Circle(CROQUIS6_R)
        with Locations((16.655278924, -49.020997464)):
            Circle(CROQUIS6_R)
        with Locations((100.798959583, -49.020997464)):
            Circle(CROQUIS6_R)
        with Locations((100.798959583, -21.720997464)):
            Circle(CROQUIS6_R)
    extrude(amount=-CORTAR_EXTRUIR4_DEPTH, mode=Mode.SUBTRACT)


solid = part.part
